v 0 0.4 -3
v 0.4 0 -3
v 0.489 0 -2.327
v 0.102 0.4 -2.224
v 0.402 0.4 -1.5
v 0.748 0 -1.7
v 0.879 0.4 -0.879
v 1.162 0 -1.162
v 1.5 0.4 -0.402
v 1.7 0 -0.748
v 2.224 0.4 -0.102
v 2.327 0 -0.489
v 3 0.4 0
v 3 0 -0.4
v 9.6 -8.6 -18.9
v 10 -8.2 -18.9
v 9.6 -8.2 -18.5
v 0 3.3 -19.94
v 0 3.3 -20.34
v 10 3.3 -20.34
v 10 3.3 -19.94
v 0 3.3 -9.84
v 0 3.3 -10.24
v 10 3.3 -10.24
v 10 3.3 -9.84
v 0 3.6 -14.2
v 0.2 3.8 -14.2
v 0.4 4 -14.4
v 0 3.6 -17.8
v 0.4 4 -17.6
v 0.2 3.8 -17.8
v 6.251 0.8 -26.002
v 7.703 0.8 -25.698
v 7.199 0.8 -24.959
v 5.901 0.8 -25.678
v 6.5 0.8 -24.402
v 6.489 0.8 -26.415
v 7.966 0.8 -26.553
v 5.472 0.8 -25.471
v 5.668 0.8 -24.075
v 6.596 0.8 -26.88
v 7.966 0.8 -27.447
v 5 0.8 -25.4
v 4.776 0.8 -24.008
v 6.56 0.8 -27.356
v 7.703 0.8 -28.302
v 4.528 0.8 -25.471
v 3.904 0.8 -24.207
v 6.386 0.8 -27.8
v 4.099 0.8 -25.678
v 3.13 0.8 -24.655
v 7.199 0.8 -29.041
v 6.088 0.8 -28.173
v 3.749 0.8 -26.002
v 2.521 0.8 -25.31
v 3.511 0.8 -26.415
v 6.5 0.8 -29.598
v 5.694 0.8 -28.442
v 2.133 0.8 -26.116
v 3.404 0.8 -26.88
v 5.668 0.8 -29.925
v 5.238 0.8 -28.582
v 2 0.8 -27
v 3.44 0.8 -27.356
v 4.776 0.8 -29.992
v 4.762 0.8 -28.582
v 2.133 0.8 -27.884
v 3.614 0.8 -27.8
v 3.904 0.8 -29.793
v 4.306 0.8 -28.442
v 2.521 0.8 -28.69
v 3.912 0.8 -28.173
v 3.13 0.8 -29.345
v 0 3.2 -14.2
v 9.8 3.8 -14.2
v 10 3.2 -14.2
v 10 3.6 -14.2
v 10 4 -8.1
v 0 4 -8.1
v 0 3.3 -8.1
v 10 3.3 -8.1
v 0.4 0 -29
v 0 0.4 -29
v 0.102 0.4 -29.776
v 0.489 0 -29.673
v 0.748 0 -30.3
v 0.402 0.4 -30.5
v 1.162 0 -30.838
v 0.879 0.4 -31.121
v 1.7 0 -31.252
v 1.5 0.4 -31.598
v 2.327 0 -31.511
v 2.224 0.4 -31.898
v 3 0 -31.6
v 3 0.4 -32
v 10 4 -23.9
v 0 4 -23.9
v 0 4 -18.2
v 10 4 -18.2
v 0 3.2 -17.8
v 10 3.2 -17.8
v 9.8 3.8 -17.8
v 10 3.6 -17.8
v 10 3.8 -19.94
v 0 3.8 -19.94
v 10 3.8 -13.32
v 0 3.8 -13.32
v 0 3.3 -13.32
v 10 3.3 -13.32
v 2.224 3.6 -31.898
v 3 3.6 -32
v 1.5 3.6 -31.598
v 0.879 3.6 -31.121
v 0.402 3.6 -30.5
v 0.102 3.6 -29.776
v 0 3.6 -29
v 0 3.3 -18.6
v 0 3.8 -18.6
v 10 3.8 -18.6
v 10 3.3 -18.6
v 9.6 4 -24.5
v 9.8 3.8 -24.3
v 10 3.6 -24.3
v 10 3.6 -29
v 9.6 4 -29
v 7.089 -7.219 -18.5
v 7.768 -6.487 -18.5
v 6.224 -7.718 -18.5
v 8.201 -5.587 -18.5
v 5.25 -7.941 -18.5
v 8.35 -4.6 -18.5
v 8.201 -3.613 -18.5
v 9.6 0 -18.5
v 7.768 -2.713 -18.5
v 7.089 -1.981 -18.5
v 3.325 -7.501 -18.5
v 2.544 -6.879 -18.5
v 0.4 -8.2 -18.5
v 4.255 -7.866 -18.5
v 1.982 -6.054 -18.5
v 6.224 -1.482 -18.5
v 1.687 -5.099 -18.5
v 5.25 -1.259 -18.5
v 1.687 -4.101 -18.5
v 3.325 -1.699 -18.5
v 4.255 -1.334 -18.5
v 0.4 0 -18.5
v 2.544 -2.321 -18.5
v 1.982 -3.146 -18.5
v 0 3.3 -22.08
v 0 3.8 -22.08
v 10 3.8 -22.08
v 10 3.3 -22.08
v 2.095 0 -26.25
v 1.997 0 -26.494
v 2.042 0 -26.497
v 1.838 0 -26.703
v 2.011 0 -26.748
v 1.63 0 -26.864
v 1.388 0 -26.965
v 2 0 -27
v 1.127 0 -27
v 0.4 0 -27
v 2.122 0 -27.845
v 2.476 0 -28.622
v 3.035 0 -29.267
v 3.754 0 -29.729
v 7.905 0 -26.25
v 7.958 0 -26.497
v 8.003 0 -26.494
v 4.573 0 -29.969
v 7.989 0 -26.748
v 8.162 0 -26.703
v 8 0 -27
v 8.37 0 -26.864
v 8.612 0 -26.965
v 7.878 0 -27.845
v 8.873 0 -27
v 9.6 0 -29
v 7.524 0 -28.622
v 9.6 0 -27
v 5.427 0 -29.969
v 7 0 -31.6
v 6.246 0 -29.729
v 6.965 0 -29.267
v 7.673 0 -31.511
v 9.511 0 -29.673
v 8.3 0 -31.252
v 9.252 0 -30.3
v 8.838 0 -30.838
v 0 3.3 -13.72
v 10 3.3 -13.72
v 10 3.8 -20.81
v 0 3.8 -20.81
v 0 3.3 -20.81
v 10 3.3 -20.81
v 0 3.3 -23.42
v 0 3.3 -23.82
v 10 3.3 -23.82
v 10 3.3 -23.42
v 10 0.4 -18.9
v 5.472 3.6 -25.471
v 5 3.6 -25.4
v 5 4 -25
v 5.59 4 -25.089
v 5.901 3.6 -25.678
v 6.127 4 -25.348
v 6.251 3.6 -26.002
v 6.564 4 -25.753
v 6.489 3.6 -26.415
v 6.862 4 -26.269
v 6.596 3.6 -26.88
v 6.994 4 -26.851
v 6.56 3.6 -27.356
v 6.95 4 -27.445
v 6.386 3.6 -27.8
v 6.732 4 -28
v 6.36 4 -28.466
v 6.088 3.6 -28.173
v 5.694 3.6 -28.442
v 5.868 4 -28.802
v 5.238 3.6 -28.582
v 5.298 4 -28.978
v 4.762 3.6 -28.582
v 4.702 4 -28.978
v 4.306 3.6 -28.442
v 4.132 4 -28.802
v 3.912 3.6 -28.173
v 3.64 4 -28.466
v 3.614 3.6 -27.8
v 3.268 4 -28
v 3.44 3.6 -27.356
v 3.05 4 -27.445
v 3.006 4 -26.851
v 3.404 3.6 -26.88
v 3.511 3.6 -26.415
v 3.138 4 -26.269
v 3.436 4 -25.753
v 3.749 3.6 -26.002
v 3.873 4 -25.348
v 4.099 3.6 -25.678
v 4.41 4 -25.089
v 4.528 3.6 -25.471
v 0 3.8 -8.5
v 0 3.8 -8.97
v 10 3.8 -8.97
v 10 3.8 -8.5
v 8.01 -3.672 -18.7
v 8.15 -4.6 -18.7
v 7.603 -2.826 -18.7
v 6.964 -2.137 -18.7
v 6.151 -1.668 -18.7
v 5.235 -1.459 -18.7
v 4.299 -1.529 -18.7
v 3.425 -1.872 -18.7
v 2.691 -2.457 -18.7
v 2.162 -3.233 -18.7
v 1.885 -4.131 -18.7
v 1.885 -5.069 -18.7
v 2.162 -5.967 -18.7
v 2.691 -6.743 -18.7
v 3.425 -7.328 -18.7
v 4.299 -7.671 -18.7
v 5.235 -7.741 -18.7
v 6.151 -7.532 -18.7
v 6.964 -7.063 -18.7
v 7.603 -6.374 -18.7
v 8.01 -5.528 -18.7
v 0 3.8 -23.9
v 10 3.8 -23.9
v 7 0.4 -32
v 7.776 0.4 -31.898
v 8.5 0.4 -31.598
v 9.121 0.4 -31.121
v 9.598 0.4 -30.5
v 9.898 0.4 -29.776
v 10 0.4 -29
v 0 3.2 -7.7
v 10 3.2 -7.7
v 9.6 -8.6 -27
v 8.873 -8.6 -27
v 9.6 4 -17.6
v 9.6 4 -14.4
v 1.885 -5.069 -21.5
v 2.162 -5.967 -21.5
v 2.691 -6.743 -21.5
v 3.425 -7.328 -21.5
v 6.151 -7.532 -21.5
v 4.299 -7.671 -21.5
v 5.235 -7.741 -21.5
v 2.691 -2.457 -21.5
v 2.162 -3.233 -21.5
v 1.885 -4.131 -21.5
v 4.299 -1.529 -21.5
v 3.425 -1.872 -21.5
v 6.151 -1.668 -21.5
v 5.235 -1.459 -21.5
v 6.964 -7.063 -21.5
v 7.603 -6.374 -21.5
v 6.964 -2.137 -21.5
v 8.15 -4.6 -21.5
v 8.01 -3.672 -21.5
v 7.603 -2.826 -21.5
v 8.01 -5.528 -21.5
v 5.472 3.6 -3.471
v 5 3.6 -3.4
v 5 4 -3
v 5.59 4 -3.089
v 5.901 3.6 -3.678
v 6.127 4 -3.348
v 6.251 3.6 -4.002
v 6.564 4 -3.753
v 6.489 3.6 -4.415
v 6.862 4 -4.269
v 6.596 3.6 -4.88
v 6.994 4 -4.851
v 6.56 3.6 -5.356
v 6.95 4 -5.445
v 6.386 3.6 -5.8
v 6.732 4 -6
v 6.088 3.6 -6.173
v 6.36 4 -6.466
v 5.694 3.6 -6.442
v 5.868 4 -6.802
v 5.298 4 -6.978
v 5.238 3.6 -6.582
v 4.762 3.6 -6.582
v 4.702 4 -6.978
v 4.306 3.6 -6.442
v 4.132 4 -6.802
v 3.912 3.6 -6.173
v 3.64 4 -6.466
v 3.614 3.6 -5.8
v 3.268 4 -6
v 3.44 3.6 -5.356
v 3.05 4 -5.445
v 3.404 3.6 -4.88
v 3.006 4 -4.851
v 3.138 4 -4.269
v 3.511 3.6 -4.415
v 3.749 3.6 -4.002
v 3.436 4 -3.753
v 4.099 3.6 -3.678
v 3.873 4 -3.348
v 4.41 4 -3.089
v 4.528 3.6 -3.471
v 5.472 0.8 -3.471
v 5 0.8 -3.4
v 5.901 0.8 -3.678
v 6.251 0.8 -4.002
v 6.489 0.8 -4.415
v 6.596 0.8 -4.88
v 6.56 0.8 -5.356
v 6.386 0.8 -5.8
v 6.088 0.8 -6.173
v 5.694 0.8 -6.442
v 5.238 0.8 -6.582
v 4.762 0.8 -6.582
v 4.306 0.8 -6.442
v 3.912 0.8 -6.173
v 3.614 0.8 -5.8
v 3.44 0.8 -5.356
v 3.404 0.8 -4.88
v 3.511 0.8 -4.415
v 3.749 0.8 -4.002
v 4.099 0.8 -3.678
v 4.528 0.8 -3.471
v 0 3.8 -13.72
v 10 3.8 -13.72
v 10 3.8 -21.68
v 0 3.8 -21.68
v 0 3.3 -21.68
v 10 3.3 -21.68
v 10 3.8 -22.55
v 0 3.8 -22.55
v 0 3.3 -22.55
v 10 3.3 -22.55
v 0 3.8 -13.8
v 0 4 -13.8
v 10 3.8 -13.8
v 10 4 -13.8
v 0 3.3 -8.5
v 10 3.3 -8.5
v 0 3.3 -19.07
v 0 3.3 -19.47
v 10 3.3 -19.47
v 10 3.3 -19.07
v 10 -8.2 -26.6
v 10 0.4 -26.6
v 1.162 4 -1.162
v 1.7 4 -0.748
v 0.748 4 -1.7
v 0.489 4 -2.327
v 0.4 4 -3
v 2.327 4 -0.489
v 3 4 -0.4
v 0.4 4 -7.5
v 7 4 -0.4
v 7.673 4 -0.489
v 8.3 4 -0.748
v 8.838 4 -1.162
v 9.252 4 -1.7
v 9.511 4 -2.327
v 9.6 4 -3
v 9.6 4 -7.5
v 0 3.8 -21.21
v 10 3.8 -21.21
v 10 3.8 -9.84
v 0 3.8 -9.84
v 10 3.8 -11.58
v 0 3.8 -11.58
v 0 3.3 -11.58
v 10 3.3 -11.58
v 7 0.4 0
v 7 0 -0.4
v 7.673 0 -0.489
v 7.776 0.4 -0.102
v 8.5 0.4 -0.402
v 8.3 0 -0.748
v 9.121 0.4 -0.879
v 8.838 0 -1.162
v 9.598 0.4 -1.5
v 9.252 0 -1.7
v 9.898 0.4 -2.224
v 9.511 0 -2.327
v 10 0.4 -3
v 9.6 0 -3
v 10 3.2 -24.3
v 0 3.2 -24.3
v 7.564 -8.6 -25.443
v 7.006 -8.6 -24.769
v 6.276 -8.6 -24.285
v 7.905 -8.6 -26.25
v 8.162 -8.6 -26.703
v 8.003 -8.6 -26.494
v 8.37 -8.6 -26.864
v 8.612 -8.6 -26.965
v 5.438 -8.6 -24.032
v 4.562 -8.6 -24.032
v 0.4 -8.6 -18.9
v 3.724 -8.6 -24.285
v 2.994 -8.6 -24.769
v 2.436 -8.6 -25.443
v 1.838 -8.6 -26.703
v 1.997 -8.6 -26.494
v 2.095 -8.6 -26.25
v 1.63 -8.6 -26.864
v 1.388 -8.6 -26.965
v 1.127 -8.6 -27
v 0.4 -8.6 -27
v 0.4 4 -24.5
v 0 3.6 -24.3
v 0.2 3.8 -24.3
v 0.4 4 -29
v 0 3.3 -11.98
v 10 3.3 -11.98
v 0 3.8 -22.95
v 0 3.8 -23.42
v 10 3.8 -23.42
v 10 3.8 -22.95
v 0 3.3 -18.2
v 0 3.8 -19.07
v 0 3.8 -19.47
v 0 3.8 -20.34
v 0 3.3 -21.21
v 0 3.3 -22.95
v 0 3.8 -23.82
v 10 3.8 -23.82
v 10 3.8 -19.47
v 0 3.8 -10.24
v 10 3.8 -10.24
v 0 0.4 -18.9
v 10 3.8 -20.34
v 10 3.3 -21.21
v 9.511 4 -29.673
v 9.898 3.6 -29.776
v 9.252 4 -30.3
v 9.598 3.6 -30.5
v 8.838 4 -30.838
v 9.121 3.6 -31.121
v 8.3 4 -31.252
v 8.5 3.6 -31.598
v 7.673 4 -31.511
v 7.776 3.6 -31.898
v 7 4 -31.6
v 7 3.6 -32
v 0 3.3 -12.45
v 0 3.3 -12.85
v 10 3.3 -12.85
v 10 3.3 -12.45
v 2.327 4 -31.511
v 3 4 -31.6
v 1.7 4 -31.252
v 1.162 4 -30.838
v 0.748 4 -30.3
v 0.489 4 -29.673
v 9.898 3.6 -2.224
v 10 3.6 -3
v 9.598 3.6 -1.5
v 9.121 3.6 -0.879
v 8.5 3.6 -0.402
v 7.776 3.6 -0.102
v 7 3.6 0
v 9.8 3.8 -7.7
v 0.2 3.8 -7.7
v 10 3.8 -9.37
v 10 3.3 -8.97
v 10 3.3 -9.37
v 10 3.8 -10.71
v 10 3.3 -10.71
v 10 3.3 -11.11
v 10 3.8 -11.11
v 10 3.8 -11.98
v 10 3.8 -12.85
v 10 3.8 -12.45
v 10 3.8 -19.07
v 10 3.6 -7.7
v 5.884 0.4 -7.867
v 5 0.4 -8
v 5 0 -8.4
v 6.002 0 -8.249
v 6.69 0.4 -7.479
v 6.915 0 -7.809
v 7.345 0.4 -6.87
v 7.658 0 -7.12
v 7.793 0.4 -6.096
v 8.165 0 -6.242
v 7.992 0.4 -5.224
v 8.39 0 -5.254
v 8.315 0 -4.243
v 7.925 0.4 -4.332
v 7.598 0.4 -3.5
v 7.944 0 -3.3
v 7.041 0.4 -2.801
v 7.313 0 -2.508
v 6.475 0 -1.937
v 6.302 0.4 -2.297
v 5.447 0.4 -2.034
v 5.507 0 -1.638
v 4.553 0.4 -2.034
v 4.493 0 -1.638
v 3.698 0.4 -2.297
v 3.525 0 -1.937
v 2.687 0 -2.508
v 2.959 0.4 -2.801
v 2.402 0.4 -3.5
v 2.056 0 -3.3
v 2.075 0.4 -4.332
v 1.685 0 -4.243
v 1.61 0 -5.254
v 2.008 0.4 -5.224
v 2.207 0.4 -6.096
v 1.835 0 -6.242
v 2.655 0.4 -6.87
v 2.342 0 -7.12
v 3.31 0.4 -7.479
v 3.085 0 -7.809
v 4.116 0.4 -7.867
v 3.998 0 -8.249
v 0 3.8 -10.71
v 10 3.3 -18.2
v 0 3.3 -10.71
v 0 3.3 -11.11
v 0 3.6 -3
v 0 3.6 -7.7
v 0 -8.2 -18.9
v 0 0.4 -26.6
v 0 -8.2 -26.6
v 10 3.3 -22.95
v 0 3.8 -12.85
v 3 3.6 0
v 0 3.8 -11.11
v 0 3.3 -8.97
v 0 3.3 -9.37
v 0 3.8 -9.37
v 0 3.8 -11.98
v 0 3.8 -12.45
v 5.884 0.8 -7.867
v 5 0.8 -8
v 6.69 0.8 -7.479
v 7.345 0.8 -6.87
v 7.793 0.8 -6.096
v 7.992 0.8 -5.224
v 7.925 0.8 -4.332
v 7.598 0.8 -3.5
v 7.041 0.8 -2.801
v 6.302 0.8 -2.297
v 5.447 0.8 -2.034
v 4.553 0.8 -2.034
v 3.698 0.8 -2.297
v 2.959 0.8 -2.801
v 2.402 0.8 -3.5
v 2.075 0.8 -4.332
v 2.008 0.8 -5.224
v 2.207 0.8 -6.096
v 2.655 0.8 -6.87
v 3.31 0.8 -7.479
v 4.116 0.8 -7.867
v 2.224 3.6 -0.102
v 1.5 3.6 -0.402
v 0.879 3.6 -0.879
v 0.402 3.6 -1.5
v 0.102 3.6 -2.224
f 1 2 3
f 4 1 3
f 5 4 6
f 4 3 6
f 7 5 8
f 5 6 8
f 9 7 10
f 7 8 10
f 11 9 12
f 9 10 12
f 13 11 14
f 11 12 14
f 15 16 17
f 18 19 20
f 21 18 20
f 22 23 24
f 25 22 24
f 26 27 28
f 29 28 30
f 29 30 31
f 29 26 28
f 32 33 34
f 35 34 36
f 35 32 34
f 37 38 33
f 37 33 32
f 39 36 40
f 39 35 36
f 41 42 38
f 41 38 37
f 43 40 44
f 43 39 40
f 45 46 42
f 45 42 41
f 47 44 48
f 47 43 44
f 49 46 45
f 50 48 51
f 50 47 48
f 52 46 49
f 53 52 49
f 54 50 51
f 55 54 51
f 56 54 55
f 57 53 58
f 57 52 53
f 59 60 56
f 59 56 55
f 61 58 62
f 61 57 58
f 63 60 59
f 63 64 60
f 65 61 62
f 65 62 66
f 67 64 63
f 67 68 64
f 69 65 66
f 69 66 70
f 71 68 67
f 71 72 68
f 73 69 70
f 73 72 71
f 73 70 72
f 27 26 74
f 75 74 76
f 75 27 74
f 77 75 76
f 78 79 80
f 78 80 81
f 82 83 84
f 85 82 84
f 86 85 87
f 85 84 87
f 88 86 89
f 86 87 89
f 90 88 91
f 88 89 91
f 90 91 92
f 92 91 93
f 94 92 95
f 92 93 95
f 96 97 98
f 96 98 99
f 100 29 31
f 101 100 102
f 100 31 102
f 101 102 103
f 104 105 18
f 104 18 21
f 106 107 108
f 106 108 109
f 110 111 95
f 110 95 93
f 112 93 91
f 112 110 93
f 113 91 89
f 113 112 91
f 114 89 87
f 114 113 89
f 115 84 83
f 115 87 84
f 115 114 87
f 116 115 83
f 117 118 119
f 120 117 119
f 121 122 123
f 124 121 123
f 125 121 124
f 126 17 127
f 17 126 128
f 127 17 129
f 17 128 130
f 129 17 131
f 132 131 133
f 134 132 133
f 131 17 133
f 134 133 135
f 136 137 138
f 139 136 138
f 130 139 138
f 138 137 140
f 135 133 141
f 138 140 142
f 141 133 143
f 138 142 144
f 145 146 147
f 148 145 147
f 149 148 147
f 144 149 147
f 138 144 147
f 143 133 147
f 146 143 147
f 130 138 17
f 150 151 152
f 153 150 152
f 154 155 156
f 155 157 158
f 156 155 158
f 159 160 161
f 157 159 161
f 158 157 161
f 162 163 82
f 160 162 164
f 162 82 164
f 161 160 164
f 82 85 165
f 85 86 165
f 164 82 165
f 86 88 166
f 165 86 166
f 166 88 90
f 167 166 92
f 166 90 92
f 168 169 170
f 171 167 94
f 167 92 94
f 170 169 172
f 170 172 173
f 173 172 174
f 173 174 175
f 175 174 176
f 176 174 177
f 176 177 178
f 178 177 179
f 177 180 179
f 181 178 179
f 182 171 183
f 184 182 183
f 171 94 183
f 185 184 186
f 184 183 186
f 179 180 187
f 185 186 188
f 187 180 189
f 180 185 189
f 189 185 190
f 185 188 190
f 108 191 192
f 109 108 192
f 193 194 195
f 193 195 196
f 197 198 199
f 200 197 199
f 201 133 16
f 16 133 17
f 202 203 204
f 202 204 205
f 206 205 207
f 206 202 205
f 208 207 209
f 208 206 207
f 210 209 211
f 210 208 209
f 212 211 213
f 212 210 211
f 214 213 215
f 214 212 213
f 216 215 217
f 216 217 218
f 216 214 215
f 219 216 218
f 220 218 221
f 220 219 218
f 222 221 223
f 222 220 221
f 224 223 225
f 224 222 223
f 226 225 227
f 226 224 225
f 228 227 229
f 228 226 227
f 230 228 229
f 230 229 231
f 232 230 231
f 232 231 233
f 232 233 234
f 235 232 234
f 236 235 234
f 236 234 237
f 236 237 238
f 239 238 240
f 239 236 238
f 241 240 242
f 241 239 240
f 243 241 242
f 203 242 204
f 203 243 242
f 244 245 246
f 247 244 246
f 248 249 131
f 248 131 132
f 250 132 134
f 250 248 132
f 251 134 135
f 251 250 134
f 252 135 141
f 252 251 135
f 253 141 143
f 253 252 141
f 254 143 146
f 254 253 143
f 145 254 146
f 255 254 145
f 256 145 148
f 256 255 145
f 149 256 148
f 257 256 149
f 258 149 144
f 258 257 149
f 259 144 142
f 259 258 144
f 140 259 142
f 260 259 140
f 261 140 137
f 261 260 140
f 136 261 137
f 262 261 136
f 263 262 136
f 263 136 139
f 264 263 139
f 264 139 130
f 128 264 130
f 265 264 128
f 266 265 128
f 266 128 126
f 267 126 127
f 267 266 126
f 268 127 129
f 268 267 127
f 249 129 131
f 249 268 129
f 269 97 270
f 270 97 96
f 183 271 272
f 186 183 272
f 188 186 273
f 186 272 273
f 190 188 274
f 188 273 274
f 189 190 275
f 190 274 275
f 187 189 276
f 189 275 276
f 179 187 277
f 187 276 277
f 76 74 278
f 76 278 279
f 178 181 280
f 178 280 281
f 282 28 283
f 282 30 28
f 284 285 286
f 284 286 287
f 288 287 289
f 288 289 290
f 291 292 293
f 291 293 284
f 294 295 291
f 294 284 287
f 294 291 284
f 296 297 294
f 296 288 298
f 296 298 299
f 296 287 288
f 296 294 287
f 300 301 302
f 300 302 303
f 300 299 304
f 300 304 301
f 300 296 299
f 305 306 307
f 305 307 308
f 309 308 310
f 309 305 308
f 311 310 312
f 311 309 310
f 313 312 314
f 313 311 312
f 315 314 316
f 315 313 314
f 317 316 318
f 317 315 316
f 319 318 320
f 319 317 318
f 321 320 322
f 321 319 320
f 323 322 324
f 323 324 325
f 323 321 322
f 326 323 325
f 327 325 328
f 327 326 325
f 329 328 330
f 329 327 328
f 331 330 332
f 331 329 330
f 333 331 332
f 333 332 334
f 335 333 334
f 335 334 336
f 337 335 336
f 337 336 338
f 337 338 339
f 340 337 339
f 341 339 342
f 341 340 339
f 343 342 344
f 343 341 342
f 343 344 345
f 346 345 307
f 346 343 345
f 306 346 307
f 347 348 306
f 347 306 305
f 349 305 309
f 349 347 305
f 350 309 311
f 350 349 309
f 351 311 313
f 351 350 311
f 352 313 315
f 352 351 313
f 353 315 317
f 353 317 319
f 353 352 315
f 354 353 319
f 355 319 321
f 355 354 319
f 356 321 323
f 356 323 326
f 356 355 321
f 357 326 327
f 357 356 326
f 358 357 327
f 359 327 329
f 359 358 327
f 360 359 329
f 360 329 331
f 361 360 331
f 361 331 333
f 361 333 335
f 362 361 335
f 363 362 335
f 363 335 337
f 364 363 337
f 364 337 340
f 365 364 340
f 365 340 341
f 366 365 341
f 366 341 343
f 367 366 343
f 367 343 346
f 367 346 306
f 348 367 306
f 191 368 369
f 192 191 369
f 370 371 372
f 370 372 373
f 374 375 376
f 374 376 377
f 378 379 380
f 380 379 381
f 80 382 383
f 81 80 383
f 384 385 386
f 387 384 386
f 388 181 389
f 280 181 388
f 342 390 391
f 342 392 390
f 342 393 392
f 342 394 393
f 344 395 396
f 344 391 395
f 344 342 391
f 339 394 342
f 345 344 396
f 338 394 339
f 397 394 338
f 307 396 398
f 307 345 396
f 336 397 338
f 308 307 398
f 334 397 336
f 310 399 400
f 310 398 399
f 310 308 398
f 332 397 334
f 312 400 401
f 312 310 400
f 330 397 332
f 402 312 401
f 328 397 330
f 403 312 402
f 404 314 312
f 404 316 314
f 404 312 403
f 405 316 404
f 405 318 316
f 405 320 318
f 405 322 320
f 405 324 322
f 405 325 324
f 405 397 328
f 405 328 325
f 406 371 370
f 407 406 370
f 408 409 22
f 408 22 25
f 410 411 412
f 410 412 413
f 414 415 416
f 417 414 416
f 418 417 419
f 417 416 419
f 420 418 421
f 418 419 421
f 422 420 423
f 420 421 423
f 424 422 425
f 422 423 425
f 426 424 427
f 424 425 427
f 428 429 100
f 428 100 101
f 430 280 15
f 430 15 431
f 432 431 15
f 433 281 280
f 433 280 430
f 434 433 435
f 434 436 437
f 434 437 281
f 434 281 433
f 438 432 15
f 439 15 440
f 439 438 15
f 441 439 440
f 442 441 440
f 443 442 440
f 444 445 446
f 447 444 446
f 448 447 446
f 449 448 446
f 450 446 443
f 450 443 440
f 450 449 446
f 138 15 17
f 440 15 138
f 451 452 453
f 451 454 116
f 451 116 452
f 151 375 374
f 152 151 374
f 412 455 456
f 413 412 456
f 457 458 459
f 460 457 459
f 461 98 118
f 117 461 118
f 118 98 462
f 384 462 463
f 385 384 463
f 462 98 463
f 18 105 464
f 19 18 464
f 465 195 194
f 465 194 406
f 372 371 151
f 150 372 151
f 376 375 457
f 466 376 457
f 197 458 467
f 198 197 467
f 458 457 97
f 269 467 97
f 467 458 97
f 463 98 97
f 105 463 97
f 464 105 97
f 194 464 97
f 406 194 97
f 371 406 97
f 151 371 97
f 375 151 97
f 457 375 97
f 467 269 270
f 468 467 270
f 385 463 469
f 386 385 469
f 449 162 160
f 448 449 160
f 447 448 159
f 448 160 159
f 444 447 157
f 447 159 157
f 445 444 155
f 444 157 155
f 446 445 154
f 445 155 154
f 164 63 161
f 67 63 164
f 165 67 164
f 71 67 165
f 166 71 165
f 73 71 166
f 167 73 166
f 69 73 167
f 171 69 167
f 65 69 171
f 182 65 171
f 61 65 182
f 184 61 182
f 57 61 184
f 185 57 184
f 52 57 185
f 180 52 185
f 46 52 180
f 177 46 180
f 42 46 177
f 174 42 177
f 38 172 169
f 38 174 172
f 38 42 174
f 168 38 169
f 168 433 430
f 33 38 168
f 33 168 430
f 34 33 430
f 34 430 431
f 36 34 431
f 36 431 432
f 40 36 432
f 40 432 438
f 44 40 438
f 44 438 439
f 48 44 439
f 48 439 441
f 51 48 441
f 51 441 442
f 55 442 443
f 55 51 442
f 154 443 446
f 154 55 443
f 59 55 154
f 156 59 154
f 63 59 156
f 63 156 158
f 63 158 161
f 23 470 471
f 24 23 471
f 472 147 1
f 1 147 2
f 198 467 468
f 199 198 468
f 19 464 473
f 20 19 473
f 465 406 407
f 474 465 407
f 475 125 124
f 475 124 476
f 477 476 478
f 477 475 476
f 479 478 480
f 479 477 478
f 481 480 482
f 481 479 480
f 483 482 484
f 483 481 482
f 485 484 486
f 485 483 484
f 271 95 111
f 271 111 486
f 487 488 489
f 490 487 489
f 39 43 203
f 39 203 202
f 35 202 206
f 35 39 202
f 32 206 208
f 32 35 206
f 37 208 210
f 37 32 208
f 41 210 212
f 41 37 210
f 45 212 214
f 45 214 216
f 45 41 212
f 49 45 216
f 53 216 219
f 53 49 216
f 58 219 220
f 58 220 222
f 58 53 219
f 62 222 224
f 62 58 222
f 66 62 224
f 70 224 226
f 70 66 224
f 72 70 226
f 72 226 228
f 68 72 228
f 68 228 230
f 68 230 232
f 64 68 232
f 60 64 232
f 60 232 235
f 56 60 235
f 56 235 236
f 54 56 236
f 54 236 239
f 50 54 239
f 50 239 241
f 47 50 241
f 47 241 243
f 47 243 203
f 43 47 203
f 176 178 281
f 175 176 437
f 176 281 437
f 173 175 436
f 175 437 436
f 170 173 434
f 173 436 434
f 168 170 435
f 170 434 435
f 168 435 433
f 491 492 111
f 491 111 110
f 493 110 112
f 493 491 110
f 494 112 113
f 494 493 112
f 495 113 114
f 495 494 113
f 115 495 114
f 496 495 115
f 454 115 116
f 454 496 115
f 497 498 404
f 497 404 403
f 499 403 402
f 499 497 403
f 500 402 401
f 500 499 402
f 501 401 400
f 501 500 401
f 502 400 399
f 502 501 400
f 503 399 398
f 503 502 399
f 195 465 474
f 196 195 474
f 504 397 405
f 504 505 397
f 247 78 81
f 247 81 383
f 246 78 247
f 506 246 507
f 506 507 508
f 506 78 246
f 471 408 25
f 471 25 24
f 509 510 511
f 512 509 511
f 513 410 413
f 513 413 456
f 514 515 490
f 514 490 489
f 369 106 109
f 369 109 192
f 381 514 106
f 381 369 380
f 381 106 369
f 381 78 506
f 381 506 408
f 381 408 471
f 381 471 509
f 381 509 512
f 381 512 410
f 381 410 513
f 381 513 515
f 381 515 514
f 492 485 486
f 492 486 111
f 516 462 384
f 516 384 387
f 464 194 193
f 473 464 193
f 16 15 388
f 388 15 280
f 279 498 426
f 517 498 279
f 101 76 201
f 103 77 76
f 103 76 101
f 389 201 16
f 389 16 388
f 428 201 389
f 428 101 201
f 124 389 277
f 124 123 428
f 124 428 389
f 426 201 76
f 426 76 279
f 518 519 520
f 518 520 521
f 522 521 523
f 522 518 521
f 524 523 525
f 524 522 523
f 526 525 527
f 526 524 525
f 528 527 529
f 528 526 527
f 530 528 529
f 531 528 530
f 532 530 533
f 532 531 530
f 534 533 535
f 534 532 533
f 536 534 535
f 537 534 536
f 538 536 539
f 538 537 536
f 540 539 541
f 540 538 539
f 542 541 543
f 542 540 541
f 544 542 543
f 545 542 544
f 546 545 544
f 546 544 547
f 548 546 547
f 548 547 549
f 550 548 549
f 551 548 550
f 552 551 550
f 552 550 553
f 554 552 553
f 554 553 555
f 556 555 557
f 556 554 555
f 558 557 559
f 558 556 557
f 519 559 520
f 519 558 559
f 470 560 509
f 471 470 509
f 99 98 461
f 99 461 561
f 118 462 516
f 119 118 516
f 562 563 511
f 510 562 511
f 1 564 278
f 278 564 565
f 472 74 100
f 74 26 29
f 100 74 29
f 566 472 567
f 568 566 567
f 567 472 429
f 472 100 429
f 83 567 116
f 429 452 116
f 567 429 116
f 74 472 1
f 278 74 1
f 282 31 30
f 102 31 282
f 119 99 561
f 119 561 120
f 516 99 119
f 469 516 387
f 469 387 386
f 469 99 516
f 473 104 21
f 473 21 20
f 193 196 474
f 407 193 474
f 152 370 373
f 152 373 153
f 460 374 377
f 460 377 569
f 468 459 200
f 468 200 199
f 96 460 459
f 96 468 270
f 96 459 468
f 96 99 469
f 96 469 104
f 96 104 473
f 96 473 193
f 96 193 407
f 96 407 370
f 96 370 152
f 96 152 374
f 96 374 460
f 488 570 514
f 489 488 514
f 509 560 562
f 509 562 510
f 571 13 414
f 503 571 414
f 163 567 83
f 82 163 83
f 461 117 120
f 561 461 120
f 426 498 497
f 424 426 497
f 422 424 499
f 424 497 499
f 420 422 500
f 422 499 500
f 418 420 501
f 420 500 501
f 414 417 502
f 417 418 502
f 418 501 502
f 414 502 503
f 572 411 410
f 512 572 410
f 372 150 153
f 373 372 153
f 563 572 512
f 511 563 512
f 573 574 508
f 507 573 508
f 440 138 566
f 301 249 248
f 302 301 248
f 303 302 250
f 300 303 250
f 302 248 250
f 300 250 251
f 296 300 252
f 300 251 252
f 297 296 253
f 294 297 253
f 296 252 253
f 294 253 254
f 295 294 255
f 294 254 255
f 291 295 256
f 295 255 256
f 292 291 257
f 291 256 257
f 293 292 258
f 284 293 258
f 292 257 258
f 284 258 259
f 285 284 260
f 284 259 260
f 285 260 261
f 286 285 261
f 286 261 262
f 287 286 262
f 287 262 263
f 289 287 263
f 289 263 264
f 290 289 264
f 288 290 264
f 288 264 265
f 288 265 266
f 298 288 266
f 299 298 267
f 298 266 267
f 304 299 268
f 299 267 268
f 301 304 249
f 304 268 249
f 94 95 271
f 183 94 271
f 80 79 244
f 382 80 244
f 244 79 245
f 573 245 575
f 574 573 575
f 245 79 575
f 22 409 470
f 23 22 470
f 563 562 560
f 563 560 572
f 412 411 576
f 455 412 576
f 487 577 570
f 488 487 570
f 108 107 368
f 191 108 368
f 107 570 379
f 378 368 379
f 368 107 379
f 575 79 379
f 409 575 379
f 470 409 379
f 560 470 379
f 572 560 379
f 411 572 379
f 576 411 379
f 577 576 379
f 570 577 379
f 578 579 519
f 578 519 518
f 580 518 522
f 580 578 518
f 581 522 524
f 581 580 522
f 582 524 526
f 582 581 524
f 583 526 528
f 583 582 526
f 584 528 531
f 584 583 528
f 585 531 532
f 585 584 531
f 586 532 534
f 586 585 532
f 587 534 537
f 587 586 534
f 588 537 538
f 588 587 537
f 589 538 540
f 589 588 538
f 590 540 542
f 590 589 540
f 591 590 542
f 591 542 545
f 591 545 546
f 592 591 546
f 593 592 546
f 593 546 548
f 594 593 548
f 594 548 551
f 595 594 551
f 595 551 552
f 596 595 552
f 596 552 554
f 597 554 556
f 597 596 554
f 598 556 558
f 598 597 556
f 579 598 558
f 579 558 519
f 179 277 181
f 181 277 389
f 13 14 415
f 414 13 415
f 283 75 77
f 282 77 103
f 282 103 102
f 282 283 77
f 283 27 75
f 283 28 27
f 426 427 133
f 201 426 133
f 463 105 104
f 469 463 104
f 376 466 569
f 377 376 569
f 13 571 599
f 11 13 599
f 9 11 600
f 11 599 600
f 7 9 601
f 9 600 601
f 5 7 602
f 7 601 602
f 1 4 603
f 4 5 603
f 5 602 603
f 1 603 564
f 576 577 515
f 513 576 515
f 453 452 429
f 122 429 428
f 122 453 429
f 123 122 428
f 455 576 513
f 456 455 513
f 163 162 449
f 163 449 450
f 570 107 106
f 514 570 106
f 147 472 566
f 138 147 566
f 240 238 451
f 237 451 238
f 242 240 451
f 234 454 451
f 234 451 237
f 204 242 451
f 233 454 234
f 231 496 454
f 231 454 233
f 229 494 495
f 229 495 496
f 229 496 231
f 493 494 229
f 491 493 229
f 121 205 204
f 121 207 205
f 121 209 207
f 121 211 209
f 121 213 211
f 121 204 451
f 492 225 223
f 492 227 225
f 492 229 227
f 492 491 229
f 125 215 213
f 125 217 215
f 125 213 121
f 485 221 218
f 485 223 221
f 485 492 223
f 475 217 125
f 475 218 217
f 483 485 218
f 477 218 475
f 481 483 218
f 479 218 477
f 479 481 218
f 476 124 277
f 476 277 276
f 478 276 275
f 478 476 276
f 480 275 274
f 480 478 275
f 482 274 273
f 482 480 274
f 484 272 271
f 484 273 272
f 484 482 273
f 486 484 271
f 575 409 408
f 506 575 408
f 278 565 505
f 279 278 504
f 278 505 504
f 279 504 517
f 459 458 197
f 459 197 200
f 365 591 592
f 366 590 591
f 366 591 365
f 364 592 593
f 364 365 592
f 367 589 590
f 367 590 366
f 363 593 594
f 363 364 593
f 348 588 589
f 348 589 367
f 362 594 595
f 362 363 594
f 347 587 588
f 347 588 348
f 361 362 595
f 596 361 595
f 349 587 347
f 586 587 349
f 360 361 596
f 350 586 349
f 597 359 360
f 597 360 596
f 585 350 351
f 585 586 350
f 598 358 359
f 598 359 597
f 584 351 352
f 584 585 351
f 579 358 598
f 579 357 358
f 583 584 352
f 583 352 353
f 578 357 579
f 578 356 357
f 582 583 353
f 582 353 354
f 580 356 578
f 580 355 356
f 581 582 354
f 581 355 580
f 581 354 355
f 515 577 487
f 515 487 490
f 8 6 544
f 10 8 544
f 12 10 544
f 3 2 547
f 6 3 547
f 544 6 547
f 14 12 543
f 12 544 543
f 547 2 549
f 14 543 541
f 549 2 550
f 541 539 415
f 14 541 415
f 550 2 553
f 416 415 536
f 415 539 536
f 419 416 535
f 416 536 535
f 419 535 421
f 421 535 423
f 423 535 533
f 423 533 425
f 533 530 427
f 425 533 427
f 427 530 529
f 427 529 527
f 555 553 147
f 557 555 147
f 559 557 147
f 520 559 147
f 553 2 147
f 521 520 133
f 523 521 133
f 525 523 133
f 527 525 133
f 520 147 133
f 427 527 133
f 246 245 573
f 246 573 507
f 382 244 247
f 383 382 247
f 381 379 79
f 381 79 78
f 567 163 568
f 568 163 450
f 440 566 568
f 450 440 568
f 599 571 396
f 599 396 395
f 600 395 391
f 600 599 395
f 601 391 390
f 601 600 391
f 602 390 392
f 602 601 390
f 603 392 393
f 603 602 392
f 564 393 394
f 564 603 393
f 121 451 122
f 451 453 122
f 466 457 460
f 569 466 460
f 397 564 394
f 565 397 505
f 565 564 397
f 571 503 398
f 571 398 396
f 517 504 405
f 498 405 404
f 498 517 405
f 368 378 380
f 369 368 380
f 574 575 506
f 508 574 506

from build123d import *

# Parameters (mm, degrees)
SKETCH_1_W          = 10
SKETCH_1_H          = 32
SKETCH_1_R          = 1.6
EXTRUDE_1_DEPTH     = 4
SKETCH_2_W          = 10
SKETCH_2_H          = 8.5
EXTRUDE_2_DEPTH     = 8.6
SKETCH_3_R          = 3.15
CUT_EXTRUDE_1_DEPTH = 3
SKETCH_4_R          = 3
CUT_EXTRUDE_2_DEPTH = 35.611558763
SKETCH_5_W          = 10
SKETCH_5_H          = 6.5
CUT_EXTRUDE_3_DEPTH = 0.8
SKETCH_6_W          = 10
SKETCH_6_H          = 5.7
EXTRUDE_3_DEPTH     = 0.2
EXTRUDE_3_2_DEPTH   = 0.2
SKETCH_7_W          = 10
SKETCH_7_H          = 0.4
EXTRUDE_4_DEPTH     = 0.7
CUT_EXTRUDE_START   = -0.8
SKETCH_8_R          = 3
CUT_EXTRUDE_4_DEPTH = 0.8
FILLET_1_R          = 3
FILLET_3_R          = 1
CHAMFER_1_SIZE      = 0.2
CHAMFER_4_SIZE      = 0.4
CHAMFER_6_SIZE      = 0.2


with BuildPart() as part:
    # 草图1 → 凸台-拉伸1 (new body)
    with BuildSketch(Plane(origin=(0, 0, 0), x_dir=(1, 0, 0), z_dir=(0, 1, 0))):
        with Locations((5, 16)):
            Rectangle(SKETCH_1_W, SKETCH_1_H)
        with Locations(Location((5, 27, 0), (0, 0, 270))):
            Circle(SKETCH_1_R, mode=Mode.SUBTRACT)
        with Locations(Location((5, 5, 0), (0, 0, 270))):
            Circle(SKETCH_1_R, mode=Mode.SUBTRACT)
    extrude(amount=EXTRUDE_1_DEPTH)

    # 草图2 → 凸台-拉伸2 (add)
    with BuildSketch(Plane(origin=(0, 0, 0), x_dir=(-1, 0, 0), z_dir=(0, -1, 0))):
        with Locations((-5, 22.75)):
            Rectangle(SKETCH_2_W, SKETCH_2_H)
    extrude(amount=EXTRUDE_2_DEPTH)

    # 草图3 → 切除-拉伸1 (cut)
    with BuildSketch(Plane.XY.offset(-18.5)):
        with Locations((5, -4.6)):
            Circle(SKETCH_3_R)
    extrude(amount=-CUT_EXTRUDE_1_DEPTH, mode=Mode.SUBTRACT)

    # 草图4 → 切除-拉伸2 (cut, through all)
    with BuildSketch(Plane(origin=(0, 0, 0), x_dir=(-1, 0, 0), z_dir=(0, -1, 0))):
        with Locations((-5, 27)):
            Circle(SKETCH_4_R)
    extrude(amount=CUT_EXTRUDE_2_DEPTH, mode=Mode.SUBTRACT)

    # 草图5 → 切除-拉伸3 (cut)
    with BuildSketch(Plane(origin=(0, 4, 0), x_dir=(1, 0, 0), z_dir=(0, 1, 0))):
        with Locations((5, 21.05)):
            Rectangle(SKETCH_5_W, SKETCH_5_H)
        with Locations((5, 10.95)):
            Rectangle(SKETCH_5_W, SKETCH_5_H)
    extrude(amount=-CUT_EXTRUDE_3_DEPTH, mode=Mode.SUBTRACT)

    # 草图8 → 切除-拉伸4 (cut)
    with BuildSketch(Plane(origin=(0, 0, 0), x_dir=(-1, 0, 0), z_dir=(0, -1, 0)).offset(CUT_EXTRUDE_START)):
        with Locations(Location((-5, 5, 0), (0, 0, 90))):
            Circle(SKETCH_8_R)
        with Locations((-5, 27)):
            Circle(SKETCH_8_R)
    extrude(amount=CUT_EXTRUDE_4_DEPTH, mode=Mode.SUBTRACT)

    # 圆角1
    fillet_1_edges = [part.edges().sort_by_distance(p)[0] for p in [
        (0, 2, -32),
        (10, 2, -32),
        (10, 2, 0),
        (0, 2, 0),
    ]]
    fillet(fillet_1_edges, radius=FILLET_1_R)

    # 圆角3
    # the kernel refuses this fillet: 1 mm, written as the material it takes off along each edge
    with BuildSketch(Plane(origin=(8, -10.782458366, -27), x_dir=(1, 0, 0), z_dir=(0, 1, 0)), Plane(origin=(2, 0, -27), x_dir=(-1, 0, 0), z_dir=(0, -1, 0))) as fillet_3_piece_1:
        with BuildLine():
            CenterArc((0.872983346, -1), FILLET_3_R, 90, 75.522487814)
            ThreePointArc((-0.09526249, -0.75), (-0.023910911, -0.378012877), (0, 0))
            Line((0, 0), (0.872983346, 0))
        make_face()
    extrude(amount=10.782458366, mode=Mode.SUBTRACT)

    # 倒角1
    chamfer_1_edges = [part.edges().sort_by_distance(p)[0] for p in [
        (5, 4, -17.8),
        (5, 4, -24.3),
        (5, 4, -7.7),
        (5, 4, -14.2),
    ]]
    chamfer(chamfer_1_edges, length=CHAMFER_1_SIZE)

    # 倒角4
    chamfer_4_edges = [part.edges().sort_by_distance(p)[0] for p in [
        (10, 4, -26.75),
        (0, 4, -26.75),
        (10, 4, -16),
        (0, 4, -16),
        (5, 4, -6.6),
        (0, 4, -5.25),
        (10, 4, -5.25),
        (0.878679656, 4, -0.878679656),
        (9.121320344, 4, -0.878679656),
        (5, 4, 0),
        (5, 4, -28.6),
        (5, 0, -2),
        (10, 0, -10.75),
        (9.121320344, 0, -0.878679656),
        (5, 0, 0),
        (0.878679656, 0, -0.878679656),
        (10, -4.3, -27),
        (0, 0, -10.75),
        (10, -4.3, -18.5),
        (10, -8.6, -22.75),
        (5, -8.6, -18.5),
        (0, -4.3, -18.5),
        (0, -8.6, -22.75),
        (0, -4.3, -27),
        (0, 0, -28),
        (10, 0, -28),
        (5, 0, -32),
        (5, 4, -32),
        (9.121320344, 0, -31.121320344),
        (0.878679656, 0, -31.121320344),
        (9.121320344, 4, -31.121320344),
        (0.878679656, 4, -31.121320344),
    ]]
    chamfer(chamfer_4_edges, length=CHAMFER_4_SIZE)

    # 倒角6
    chamfer_6_edges = [part.edges().sort_by_distance(p)[0] for p in [
        (1.85, -4.6, -18.5),
    ]]
    chamfer(chamfer_6_edges, length=CHAMFER_6_SIZE)


with BuildPart() as body_2:
    # 草图6 → 凸台-拉伸3 (new body)
    with BuildSketch(Plane(origin=(0, 4, 0), x_dir=(1, 0, 0), z_dir=(0, 1, 0))):
        with Locations((5, 10.95)):
            Rectangle(SKETCH_6_W, SKETCH_6_H)
    extrude(amount=-EXTRUDE_3_DEPTH)



with BuildPart() as body_3:
    # 草图6 → Extrude 3 2 (new body)
    with BuildSketch(Plane(origin=(0, 4, 0), x_dir=(1, 0, 0), z_dir=(0, 1, 0))):
        with Locations((5, 21.05)):
            Rectangle(SKETCH_6_W, SKETCH_6_H)
    extrude(amount=-EXTRUDE_3_2_DEPTH)


with BuildPart() as body_2_1:
    add(body_2.part)

    add(body_3.part)  # 凸台-拉伸4 merges body 3
    # 草图7 → 凸台-拉伸4 (add)
    with BuildSketch(Plane(origin=(0, 4, 0), x_dir=(1, 0, 0), z_dir=(0, 1, 0))):
        with Locations((5, 8.3)):
            Rectangle(SKETCH_7_W, SKETCH_7_H)
        with Locations((5, 18.4)):
            Rectangle(SKETCH_7_W, SKETCH_7_H)
        with Locations((5, 19.27)):
            Rectangle(SKETCH_7_W, SKETCH_7_H)
        with Locations((5, 9.17)):
            Rectangle(SKETCH_7_W, SKETCH_7_H)
        with Locations((5, 20.14)):
            Rectangle(SKETCH_7_W, SKETCH_7_H)
        with Locations((5, 10.04)):
            Rectangle(SKETCH_7_W, SKETCH_7_H)
        with Locations((5, 21.01)):
            Rectangle(SKETCH_7_W, SKETCH_7_H)
        with Locations((5, 10.91)):
            Rectangle(SKETCH_7_W, SKETCH_7_H)
        with Locations((5, 21.88)):
            Rectangle(SKETCH_7_W, SKETCH_7_H)
        with Locations((5, 11.78)):
            Rectangle(SKETCH_7_W, SKETCH_7_H)
        with Locations((5, 22.75)):
            Rectangle(SKETCH_7_W, SKETCH_7_H)
        with Locations((5, 12.65)):
            Rectangle(SKETCH_7_W, SKETCH_7_H)
        with Locations((5, 23.62)):
            Rectangle(SKETCH_7_W, SKETCH_7_H)
        with Locations((5, 13.52)):
            Rectangle(SKETCH_7_W, SKETCH_7_H)
    extrude(amount=-EXTRUDE_4_DEPTH)


solid = Compound([part.part, body_2_1.part])
